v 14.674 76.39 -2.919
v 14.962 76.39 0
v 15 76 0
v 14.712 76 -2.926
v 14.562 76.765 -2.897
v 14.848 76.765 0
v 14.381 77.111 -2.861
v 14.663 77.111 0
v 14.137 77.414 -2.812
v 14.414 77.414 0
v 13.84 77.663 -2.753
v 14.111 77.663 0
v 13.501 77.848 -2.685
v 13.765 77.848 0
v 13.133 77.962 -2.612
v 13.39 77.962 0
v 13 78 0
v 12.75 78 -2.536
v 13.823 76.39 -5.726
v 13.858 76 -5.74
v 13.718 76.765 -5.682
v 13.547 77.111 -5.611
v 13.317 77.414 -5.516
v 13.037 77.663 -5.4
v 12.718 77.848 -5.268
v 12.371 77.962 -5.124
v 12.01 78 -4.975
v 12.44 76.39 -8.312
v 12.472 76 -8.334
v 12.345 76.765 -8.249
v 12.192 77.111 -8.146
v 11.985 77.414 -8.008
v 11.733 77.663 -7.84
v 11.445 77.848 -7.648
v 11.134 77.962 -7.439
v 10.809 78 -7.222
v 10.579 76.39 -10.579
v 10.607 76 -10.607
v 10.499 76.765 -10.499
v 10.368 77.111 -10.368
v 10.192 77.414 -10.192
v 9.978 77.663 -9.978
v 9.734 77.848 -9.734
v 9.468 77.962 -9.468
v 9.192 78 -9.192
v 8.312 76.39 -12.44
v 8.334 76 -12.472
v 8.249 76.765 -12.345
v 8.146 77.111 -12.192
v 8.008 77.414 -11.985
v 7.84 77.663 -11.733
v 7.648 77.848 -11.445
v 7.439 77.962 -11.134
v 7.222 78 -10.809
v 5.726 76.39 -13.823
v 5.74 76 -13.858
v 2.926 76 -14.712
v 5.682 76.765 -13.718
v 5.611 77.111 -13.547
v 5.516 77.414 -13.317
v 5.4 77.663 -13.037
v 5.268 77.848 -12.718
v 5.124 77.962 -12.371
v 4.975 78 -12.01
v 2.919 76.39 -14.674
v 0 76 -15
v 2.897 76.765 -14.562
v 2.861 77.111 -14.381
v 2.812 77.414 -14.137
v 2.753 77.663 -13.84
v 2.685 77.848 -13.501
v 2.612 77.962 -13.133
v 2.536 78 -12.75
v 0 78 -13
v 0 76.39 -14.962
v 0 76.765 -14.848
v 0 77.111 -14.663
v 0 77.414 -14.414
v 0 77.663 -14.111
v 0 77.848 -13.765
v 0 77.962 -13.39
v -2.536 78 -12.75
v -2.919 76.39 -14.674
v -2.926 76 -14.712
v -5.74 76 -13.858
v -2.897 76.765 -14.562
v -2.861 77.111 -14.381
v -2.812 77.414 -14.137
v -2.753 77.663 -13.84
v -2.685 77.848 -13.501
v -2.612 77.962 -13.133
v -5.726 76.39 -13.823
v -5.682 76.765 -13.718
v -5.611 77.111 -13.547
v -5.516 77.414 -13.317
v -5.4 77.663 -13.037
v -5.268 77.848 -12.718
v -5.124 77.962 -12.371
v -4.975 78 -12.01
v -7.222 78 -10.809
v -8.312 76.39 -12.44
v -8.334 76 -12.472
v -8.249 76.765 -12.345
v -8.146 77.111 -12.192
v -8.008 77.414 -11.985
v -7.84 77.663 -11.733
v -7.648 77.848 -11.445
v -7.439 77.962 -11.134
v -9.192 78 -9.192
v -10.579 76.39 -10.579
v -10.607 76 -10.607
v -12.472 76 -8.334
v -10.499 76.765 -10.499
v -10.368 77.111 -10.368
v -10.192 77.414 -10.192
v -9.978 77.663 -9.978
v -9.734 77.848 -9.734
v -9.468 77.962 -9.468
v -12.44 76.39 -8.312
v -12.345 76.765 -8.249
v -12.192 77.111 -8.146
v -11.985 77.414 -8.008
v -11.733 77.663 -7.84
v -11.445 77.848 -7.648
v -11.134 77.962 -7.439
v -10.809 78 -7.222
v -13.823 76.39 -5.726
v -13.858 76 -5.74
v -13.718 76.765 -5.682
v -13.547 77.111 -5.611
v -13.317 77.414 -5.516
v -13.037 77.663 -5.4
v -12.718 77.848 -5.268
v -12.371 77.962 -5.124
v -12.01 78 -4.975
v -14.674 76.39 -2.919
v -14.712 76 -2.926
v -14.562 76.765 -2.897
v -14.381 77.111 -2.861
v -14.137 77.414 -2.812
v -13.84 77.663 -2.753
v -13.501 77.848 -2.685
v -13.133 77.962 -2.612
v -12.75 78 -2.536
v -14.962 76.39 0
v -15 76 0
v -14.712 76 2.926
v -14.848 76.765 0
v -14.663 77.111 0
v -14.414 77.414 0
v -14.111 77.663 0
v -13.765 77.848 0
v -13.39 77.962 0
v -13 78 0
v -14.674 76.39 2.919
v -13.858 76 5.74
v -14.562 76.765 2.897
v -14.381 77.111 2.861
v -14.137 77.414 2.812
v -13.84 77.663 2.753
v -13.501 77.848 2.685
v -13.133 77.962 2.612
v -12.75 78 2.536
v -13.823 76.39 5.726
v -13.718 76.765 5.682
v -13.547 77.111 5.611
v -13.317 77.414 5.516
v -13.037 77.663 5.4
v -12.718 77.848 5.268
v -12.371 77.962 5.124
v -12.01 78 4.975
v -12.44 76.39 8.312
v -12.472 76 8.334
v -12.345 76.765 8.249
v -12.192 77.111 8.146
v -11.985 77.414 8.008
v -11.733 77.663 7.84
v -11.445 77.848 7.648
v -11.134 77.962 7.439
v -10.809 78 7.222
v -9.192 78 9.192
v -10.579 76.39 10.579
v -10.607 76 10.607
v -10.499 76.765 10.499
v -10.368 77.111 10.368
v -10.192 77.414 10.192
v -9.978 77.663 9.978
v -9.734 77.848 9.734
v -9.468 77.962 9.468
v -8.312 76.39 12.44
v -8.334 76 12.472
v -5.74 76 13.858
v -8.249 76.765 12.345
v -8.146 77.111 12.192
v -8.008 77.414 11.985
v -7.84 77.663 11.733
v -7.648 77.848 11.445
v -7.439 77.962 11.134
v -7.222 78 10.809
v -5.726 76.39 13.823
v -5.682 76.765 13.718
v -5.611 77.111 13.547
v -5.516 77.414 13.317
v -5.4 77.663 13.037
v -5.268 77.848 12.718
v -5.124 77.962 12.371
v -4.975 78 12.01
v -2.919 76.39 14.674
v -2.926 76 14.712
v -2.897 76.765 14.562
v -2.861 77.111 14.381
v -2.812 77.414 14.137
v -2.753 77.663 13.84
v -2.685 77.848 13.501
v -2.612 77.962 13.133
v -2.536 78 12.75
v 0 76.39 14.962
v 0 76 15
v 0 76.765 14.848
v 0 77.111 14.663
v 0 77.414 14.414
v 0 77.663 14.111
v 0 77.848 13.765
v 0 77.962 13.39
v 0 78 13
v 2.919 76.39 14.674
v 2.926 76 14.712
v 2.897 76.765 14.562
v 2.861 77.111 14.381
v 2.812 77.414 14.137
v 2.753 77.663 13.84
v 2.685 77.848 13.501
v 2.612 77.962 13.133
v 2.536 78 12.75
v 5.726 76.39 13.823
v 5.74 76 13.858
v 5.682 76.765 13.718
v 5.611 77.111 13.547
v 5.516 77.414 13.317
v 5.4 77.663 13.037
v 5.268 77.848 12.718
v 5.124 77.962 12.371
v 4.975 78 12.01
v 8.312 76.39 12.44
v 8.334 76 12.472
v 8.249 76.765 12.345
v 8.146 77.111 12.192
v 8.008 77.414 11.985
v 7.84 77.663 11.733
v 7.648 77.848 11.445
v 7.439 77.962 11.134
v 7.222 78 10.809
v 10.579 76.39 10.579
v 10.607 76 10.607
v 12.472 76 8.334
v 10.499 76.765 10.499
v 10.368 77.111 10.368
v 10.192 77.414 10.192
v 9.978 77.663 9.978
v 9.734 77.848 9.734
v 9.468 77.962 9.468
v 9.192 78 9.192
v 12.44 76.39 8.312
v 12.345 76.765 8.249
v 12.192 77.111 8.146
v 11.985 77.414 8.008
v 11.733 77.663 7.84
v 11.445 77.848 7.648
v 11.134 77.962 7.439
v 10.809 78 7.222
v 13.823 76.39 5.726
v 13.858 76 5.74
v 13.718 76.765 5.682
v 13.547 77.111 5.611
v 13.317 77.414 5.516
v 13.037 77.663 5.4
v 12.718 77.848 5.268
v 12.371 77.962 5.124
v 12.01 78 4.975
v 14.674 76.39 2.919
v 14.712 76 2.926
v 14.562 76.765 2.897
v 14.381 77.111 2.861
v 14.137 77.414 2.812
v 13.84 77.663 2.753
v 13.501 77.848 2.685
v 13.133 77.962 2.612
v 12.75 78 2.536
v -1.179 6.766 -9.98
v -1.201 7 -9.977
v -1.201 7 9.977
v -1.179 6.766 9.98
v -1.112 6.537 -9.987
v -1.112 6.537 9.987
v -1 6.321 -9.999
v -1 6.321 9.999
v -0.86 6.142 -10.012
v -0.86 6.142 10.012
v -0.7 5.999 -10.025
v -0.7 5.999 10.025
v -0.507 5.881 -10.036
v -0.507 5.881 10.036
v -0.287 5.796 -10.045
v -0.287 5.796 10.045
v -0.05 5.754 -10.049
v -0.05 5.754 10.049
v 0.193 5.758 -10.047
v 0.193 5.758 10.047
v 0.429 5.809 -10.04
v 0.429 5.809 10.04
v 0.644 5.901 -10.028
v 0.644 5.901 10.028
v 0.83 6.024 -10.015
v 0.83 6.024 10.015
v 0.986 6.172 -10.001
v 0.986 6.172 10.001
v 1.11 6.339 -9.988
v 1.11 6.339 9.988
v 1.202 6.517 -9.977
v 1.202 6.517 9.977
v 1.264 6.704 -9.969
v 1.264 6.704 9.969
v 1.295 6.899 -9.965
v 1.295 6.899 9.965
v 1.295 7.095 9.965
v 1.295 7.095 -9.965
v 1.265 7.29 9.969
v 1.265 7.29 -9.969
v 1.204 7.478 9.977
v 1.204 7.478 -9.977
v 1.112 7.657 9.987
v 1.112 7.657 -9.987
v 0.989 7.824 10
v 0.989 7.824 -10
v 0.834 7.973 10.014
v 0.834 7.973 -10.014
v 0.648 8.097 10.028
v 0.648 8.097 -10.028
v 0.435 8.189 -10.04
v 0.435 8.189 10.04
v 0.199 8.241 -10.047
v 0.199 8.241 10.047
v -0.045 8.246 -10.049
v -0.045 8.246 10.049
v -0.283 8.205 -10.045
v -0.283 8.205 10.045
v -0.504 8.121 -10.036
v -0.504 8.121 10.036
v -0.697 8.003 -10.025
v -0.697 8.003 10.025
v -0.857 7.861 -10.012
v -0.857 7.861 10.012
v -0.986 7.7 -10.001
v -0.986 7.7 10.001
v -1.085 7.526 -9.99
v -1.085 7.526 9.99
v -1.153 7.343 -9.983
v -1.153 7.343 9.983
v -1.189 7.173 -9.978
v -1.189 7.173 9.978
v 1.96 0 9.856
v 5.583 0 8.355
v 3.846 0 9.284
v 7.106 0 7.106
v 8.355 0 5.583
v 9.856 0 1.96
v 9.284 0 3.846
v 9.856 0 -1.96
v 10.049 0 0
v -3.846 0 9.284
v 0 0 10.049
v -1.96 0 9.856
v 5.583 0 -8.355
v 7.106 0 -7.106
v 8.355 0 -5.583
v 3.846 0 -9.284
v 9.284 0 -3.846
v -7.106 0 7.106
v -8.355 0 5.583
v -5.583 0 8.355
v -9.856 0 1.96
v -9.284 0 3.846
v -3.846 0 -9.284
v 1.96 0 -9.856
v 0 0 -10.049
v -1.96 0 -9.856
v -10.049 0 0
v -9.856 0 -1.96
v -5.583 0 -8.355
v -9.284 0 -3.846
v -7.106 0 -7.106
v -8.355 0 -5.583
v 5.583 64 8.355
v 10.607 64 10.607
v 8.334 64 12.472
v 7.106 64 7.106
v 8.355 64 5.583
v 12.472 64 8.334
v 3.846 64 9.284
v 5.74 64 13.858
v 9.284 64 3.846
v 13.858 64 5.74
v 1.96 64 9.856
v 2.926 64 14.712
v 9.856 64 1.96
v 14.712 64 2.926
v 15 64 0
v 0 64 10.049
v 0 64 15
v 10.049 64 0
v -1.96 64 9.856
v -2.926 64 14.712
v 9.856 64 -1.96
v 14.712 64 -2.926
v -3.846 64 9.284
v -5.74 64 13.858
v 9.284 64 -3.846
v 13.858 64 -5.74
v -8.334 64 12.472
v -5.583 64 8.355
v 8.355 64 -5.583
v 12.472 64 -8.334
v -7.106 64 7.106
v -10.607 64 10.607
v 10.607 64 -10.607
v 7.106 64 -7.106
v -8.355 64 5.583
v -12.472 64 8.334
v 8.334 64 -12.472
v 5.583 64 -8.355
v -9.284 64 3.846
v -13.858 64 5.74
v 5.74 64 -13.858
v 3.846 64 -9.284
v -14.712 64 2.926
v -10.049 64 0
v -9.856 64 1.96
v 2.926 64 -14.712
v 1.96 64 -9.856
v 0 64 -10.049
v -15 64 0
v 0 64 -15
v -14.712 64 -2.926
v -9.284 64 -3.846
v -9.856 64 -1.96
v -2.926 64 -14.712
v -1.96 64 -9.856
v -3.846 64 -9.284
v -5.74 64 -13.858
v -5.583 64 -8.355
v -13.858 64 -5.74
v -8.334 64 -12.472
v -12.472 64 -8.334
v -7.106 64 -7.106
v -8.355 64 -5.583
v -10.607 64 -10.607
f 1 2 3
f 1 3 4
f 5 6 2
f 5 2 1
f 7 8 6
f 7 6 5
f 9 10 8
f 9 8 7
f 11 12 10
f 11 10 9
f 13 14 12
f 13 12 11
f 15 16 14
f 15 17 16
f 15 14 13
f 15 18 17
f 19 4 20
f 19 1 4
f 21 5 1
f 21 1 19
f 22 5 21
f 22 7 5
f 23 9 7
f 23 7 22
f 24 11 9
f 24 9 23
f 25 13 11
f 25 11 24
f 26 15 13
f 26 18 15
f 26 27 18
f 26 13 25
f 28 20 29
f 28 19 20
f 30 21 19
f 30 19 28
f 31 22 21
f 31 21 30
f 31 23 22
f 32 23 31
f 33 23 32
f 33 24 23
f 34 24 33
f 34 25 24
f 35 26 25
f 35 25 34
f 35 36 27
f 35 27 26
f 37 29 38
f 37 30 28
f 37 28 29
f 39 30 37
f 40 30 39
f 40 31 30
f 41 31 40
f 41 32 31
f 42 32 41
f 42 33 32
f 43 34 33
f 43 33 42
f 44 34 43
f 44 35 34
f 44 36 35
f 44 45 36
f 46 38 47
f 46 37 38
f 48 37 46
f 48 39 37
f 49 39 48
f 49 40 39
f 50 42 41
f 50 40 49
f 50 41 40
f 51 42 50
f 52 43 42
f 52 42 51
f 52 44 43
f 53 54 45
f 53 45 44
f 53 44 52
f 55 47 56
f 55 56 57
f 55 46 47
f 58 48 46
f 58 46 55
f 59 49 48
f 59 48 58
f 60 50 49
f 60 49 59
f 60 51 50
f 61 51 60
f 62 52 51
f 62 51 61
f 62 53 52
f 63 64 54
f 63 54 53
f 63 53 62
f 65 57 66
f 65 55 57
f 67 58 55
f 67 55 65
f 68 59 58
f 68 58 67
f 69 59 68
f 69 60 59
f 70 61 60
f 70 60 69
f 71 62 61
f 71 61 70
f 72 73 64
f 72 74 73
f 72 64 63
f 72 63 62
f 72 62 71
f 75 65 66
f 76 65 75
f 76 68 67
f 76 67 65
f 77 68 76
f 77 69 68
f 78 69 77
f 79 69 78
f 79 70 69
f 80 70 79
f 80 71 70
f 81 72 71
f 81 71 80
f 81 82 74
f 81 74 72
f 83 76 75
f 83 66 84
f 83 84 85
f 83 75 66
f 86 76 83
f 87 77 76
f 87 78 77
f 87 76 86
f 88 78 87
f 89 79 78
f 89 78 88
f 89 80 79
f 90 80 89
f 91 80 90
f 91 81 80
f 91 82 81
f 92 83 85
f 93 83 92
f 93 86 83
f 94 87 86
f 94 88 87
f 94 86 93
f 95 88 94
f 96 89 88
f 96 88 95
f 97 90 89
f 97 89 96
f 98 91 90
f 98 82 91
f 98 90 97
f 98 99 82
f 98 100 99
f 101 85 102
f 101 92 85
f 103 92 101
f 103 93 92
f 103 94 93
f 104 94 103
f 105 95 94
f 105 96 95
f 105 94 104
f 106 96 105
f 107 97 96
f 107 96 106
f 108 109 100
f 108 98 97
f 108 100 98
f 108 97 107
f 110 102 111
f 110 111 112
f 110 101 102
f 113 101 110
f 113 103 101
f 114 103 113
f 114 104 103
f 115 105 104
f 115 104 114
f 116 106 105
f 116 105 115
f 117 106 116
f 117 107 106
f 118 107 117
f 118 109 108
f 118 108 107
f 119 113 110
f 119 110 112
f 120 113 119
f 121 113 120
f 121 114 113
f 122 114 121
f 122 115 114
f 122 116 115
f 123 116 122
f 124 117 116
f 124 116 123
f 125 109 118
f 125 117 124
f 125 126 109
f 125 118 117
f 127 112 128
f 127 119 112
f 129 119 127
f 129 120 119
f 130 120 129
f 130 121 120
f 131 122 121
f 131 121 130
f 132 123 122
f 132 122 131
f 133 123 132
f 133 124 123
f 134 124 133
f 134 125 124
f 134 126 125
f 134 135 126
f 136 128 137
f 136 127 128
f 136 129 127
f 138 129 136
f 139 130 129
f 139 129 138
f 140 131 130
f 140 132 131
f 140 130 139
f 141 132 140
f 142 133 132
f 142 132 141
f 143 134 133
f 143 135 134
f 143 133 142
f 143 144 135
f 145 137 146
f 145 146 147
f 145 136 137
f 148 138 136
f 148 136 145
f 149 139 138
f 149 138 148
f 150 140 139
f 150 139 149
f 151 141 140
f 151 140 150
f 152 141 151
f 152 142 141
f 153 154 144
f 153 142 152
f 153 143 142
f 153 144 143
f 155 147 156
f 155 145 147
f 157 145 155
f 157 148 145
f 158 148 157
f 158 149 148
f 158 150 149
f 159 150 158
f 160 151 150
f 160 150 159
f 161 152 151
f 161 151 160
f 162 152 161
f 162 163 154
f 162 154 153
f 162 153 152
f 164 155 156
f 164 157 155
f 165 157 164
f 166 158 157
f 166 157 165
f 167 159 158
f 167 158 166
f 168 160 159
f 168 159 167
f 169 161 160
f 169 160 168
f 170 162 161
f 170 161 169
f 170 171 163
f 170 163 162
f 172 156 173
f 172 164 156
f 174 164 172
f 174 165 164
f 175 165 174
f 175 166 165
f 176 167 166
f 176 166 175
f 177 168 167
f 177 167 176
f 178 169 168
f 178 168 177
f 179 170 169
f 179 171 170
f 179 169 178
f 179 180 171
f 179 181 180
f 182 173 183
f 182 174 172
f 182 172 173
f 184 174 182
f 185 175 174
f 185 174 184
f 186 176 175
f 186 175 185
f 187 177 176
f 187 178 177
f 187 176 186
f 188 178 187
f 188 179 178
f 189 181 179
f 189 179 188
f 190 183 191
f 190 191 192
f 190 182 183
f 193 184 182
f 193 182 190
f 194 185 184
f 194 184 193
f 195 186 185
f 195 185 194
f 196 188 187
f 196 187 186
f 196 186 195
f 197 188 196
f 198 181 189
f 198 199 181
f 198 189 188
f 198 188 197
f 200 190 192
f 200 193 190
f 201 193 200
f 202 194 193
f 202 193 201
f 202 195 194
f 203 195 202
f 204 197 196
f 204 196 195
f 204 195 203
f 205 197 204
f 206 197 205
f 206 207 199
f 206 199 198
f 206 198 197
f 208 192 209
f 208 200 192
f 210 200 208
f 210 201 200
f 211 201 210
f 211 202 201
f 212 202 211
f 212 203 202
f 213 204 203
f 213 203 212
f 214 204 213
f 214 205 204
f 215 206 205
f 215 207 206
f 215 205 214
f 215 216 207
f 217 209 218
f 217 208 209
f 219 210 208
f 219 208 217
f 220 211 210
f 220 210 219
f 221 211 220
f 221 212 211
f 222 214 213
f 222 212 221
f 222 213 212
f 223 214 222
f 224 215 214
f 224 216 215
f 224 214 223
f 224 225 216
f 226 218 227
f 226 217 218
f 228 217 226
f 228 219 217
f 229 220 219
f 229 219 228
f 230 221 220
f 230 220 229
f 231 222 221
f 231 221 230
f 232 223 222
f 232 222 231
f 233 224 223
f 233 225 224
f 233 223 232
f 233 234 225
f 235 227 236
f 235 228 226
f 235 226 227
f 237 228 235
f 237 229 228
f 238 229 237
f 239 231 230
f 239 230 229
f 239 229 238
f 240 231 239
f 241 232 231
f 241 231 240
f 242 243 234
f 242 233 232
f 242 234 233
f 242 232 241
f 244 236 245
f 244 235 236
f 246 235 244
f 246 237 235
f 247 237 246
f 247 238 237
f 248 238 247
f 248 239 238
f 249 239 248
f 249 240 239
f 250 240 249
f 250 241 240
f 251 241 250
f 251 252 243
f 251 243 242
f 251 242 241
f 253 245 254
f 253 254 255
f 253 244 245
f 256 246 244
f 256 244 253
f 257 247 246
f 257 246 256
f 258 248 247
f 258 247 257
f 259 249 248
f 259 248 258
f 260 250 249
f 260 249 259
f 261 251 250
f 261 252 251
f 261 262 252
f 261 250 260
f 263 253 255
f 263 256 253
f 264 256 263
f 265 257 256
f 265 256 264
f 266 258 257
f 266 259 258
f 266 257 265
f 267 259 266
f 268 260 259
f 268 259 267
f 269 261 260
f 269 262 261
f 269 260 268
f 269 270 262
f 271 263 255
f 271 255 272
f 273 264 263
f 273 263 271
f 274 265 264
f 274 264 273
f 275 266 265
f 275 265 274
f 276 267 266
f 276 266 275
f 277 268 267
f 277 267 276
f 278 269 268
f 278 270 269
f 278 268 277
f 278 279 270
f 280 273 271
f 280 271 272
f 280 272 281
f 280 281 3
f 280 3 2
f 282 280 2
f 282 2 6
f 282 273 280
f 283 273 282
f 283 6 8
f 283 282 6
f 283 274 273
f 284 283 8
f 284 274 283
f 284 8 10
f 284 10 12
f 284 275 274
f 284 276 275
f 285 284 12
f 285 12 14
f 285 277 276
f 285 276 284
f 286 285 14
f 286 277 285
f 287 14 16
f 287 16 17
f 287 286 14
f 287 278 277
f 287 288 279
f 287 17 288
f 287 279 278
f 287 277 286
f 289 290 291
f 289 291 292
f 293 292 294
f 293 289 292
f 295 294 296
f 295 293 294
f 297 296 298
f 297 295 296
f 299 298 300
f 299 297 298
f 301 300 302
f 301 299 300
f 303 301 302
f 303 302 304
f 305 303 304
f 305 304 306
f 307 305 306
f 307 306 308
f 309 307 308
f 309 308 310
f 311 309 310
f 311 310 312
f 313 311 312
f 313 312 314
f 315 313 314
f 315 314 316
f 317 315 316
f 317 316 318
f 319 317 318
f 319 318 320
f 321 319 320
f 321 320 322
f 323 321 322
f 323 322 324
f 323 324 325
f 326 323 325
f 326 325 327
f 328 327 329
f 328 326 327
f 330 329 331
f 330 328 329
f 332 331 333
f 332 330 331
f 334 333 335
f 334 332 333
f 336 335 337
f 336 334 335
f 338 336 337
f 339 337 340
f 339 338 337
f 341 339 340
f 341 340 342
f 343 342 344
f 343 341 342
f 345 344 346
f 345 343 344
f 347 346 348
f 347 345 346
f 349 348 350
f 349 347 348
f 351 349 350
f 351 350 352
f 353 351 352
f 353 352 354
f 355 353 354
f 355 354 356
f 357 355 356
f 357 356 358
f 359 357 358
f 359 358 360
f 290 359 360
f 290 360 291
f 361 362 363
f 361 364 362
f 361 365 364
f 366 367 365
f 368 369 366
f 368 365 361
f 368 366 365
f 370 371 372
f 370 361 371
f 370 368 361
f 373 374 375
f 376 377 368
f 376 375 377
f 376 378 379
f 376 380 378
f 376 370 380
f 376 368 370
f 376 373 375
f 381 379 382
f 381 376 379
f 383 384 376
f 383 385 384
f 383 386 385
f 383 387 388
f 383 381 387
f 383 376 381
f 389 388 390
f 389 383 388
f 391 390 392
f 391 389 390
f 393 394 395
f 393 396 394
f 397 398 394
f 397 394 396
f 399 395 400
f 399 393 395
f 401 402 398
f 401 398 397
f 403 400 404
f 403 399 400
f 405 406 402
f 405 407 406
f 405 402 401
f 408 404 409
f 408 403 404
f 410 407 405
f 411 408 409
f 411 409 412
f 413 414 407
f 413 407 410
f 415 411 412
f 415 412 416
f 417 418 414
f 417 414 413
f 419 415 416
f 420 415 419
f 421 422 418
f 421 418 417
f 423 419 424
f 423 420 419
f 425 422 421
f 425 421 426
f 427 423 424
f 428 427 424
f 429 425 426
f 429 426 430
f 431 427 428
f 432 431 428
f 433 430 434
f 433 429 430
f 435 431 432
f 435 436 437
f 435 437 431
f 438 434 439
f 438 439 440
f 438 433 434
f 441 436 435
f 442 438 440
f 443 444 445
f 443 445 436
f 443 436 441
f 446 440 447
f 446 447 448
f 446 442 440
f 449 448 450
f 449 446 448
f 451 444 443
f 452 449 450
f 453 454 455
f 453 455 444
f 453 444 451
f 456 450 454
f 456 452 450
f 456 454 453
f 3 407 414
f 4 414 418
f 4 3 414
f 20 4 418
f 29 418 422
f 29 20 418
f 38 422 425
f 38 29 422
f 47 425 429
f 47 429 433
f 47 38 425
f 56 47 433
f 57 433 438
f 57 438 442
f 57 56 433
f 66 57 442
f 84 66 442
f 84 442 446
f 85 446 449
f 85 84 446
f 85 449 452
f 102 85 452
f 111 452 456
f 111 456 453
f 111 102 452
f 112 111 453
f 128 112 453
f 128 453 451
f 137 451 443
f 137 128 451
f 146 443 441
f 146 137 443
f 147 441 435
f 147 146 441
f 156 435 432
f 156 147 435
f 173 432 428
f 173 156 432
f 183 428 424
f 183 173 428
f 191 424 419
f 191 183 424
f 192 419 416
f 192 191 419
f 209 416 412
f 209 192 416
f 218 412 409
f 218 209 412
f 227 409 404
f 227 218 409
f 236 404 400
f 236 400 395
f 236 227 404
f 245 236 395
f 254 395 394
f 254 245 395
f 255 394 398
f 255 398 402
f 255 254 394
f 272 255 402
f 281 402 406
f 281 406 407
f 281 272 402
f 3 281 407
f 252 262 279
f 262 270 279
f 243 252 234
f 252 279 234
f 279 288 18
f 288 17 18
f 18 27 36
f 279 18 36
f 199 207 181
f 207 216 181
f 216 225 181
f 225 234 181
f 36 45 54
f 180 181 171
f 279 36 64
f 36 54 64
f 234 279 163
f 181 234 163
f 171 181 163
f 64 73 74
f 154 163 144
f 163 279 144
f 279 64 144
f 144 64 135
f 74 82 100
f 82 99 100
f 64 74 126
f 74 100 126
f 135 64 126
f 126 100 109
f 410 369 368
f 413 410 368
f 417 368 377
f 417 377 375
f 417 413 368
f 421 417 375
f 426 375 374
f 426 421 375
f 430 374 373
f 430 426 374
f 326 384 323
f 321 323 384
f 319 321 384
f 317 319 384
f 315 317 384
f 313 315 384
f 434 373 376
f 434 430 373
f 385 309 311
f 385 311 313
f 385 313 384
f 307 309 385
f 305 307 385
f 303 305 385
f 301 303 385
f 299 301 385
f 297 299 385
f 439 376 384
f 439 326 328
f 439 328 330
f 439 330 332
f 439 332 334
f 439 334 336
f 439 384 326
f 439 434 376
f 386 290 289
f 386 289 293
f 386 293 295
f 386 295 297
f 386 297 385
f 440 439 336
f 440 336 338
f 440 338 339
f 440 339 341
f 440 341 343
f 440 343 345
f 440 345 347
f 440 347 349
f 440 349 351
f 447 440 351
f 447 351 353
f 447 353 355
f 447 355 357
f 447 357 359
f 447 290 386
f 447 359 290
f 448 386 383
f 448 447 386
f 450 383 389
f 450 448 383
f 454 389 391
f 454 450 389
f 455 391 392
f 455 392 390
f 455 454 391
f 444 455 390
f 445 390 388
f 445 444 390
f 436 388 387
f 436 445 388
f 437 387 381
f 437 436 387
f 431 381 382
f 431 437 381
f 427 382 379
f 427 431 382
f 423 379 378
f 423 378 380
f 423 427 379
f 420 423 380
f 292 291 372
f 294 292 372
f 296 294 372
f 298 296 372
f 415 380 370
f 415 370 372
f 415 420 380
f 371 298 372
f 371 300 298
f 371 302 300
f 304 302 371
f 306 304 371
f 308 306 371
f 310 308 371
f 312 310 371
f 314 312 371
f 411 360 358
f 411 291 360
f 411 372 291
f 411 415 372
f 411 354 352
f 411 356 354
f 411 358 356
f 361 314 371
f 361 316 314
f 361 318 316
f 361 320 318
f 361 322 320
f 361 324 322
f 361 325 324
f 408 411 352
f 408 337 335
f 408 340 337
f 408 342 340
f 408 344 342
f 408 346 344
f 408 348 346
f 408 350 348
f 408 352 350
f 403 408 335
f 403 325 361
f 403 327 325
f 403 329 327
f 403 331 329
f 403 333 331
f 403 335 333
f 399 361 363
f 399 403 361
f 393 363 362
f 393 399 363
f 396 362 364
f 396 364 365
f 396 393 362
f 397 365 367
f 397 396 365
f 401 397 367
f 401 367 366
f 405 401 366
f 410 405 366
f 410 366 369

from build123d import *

# Parameters (mm, degrees)
SKETCH1_W               = 15
SKETCH1_H               = 4
FILLET3_R               = 2
CUT_EXTRUDE1_DEPTH      = 81.833161512
CUT_EXTRUDE1_DEPTH_BACK = 81.833161512
SKETCH2_R               = 1.25


with BuildPart() as part:
    # Sketch1 → Revolve2 (revolve)
    with BuildSketch(Plane.XY):
        with Locations((7.5, 76)):
            Rectangle(SKETCH1_W, SKETCH1_H)
        Polygon((0, 74), (0, 0), (10.049031003, 0), (10.049031003, 64), (15, 64), (15, 74), align=None)
    revolve(axis=Axis((0, 0, 0), (0, 1, 0)))

    # Fillet3
    fillet3_edges = [part.edges().sort_by_distance(p)[0] for p in [
        (-15, 78, 0),
    ]]
    fillet(fillet3_edges, radius=FILLET3_R)

    # Sketch2 → Cut-Extrude1 (cut, two sides: drawn at the far end of the back side and taken through both)
    with BuildSketch(Plane.XY.offset(-CUT_EXTRUDE1_DEPTH_BACK)):
        with Locations(Location((0.049031003, 7, 0), (0, 0, 180))):
            Circle(SKETCH2_R)
    extrude(amount=CUT_EXTRUDE1_DEPTH + CUT_EXTRUDE1_DEPTH_BACK, mode=Mode.SUBTRACT)


solid = part.part
